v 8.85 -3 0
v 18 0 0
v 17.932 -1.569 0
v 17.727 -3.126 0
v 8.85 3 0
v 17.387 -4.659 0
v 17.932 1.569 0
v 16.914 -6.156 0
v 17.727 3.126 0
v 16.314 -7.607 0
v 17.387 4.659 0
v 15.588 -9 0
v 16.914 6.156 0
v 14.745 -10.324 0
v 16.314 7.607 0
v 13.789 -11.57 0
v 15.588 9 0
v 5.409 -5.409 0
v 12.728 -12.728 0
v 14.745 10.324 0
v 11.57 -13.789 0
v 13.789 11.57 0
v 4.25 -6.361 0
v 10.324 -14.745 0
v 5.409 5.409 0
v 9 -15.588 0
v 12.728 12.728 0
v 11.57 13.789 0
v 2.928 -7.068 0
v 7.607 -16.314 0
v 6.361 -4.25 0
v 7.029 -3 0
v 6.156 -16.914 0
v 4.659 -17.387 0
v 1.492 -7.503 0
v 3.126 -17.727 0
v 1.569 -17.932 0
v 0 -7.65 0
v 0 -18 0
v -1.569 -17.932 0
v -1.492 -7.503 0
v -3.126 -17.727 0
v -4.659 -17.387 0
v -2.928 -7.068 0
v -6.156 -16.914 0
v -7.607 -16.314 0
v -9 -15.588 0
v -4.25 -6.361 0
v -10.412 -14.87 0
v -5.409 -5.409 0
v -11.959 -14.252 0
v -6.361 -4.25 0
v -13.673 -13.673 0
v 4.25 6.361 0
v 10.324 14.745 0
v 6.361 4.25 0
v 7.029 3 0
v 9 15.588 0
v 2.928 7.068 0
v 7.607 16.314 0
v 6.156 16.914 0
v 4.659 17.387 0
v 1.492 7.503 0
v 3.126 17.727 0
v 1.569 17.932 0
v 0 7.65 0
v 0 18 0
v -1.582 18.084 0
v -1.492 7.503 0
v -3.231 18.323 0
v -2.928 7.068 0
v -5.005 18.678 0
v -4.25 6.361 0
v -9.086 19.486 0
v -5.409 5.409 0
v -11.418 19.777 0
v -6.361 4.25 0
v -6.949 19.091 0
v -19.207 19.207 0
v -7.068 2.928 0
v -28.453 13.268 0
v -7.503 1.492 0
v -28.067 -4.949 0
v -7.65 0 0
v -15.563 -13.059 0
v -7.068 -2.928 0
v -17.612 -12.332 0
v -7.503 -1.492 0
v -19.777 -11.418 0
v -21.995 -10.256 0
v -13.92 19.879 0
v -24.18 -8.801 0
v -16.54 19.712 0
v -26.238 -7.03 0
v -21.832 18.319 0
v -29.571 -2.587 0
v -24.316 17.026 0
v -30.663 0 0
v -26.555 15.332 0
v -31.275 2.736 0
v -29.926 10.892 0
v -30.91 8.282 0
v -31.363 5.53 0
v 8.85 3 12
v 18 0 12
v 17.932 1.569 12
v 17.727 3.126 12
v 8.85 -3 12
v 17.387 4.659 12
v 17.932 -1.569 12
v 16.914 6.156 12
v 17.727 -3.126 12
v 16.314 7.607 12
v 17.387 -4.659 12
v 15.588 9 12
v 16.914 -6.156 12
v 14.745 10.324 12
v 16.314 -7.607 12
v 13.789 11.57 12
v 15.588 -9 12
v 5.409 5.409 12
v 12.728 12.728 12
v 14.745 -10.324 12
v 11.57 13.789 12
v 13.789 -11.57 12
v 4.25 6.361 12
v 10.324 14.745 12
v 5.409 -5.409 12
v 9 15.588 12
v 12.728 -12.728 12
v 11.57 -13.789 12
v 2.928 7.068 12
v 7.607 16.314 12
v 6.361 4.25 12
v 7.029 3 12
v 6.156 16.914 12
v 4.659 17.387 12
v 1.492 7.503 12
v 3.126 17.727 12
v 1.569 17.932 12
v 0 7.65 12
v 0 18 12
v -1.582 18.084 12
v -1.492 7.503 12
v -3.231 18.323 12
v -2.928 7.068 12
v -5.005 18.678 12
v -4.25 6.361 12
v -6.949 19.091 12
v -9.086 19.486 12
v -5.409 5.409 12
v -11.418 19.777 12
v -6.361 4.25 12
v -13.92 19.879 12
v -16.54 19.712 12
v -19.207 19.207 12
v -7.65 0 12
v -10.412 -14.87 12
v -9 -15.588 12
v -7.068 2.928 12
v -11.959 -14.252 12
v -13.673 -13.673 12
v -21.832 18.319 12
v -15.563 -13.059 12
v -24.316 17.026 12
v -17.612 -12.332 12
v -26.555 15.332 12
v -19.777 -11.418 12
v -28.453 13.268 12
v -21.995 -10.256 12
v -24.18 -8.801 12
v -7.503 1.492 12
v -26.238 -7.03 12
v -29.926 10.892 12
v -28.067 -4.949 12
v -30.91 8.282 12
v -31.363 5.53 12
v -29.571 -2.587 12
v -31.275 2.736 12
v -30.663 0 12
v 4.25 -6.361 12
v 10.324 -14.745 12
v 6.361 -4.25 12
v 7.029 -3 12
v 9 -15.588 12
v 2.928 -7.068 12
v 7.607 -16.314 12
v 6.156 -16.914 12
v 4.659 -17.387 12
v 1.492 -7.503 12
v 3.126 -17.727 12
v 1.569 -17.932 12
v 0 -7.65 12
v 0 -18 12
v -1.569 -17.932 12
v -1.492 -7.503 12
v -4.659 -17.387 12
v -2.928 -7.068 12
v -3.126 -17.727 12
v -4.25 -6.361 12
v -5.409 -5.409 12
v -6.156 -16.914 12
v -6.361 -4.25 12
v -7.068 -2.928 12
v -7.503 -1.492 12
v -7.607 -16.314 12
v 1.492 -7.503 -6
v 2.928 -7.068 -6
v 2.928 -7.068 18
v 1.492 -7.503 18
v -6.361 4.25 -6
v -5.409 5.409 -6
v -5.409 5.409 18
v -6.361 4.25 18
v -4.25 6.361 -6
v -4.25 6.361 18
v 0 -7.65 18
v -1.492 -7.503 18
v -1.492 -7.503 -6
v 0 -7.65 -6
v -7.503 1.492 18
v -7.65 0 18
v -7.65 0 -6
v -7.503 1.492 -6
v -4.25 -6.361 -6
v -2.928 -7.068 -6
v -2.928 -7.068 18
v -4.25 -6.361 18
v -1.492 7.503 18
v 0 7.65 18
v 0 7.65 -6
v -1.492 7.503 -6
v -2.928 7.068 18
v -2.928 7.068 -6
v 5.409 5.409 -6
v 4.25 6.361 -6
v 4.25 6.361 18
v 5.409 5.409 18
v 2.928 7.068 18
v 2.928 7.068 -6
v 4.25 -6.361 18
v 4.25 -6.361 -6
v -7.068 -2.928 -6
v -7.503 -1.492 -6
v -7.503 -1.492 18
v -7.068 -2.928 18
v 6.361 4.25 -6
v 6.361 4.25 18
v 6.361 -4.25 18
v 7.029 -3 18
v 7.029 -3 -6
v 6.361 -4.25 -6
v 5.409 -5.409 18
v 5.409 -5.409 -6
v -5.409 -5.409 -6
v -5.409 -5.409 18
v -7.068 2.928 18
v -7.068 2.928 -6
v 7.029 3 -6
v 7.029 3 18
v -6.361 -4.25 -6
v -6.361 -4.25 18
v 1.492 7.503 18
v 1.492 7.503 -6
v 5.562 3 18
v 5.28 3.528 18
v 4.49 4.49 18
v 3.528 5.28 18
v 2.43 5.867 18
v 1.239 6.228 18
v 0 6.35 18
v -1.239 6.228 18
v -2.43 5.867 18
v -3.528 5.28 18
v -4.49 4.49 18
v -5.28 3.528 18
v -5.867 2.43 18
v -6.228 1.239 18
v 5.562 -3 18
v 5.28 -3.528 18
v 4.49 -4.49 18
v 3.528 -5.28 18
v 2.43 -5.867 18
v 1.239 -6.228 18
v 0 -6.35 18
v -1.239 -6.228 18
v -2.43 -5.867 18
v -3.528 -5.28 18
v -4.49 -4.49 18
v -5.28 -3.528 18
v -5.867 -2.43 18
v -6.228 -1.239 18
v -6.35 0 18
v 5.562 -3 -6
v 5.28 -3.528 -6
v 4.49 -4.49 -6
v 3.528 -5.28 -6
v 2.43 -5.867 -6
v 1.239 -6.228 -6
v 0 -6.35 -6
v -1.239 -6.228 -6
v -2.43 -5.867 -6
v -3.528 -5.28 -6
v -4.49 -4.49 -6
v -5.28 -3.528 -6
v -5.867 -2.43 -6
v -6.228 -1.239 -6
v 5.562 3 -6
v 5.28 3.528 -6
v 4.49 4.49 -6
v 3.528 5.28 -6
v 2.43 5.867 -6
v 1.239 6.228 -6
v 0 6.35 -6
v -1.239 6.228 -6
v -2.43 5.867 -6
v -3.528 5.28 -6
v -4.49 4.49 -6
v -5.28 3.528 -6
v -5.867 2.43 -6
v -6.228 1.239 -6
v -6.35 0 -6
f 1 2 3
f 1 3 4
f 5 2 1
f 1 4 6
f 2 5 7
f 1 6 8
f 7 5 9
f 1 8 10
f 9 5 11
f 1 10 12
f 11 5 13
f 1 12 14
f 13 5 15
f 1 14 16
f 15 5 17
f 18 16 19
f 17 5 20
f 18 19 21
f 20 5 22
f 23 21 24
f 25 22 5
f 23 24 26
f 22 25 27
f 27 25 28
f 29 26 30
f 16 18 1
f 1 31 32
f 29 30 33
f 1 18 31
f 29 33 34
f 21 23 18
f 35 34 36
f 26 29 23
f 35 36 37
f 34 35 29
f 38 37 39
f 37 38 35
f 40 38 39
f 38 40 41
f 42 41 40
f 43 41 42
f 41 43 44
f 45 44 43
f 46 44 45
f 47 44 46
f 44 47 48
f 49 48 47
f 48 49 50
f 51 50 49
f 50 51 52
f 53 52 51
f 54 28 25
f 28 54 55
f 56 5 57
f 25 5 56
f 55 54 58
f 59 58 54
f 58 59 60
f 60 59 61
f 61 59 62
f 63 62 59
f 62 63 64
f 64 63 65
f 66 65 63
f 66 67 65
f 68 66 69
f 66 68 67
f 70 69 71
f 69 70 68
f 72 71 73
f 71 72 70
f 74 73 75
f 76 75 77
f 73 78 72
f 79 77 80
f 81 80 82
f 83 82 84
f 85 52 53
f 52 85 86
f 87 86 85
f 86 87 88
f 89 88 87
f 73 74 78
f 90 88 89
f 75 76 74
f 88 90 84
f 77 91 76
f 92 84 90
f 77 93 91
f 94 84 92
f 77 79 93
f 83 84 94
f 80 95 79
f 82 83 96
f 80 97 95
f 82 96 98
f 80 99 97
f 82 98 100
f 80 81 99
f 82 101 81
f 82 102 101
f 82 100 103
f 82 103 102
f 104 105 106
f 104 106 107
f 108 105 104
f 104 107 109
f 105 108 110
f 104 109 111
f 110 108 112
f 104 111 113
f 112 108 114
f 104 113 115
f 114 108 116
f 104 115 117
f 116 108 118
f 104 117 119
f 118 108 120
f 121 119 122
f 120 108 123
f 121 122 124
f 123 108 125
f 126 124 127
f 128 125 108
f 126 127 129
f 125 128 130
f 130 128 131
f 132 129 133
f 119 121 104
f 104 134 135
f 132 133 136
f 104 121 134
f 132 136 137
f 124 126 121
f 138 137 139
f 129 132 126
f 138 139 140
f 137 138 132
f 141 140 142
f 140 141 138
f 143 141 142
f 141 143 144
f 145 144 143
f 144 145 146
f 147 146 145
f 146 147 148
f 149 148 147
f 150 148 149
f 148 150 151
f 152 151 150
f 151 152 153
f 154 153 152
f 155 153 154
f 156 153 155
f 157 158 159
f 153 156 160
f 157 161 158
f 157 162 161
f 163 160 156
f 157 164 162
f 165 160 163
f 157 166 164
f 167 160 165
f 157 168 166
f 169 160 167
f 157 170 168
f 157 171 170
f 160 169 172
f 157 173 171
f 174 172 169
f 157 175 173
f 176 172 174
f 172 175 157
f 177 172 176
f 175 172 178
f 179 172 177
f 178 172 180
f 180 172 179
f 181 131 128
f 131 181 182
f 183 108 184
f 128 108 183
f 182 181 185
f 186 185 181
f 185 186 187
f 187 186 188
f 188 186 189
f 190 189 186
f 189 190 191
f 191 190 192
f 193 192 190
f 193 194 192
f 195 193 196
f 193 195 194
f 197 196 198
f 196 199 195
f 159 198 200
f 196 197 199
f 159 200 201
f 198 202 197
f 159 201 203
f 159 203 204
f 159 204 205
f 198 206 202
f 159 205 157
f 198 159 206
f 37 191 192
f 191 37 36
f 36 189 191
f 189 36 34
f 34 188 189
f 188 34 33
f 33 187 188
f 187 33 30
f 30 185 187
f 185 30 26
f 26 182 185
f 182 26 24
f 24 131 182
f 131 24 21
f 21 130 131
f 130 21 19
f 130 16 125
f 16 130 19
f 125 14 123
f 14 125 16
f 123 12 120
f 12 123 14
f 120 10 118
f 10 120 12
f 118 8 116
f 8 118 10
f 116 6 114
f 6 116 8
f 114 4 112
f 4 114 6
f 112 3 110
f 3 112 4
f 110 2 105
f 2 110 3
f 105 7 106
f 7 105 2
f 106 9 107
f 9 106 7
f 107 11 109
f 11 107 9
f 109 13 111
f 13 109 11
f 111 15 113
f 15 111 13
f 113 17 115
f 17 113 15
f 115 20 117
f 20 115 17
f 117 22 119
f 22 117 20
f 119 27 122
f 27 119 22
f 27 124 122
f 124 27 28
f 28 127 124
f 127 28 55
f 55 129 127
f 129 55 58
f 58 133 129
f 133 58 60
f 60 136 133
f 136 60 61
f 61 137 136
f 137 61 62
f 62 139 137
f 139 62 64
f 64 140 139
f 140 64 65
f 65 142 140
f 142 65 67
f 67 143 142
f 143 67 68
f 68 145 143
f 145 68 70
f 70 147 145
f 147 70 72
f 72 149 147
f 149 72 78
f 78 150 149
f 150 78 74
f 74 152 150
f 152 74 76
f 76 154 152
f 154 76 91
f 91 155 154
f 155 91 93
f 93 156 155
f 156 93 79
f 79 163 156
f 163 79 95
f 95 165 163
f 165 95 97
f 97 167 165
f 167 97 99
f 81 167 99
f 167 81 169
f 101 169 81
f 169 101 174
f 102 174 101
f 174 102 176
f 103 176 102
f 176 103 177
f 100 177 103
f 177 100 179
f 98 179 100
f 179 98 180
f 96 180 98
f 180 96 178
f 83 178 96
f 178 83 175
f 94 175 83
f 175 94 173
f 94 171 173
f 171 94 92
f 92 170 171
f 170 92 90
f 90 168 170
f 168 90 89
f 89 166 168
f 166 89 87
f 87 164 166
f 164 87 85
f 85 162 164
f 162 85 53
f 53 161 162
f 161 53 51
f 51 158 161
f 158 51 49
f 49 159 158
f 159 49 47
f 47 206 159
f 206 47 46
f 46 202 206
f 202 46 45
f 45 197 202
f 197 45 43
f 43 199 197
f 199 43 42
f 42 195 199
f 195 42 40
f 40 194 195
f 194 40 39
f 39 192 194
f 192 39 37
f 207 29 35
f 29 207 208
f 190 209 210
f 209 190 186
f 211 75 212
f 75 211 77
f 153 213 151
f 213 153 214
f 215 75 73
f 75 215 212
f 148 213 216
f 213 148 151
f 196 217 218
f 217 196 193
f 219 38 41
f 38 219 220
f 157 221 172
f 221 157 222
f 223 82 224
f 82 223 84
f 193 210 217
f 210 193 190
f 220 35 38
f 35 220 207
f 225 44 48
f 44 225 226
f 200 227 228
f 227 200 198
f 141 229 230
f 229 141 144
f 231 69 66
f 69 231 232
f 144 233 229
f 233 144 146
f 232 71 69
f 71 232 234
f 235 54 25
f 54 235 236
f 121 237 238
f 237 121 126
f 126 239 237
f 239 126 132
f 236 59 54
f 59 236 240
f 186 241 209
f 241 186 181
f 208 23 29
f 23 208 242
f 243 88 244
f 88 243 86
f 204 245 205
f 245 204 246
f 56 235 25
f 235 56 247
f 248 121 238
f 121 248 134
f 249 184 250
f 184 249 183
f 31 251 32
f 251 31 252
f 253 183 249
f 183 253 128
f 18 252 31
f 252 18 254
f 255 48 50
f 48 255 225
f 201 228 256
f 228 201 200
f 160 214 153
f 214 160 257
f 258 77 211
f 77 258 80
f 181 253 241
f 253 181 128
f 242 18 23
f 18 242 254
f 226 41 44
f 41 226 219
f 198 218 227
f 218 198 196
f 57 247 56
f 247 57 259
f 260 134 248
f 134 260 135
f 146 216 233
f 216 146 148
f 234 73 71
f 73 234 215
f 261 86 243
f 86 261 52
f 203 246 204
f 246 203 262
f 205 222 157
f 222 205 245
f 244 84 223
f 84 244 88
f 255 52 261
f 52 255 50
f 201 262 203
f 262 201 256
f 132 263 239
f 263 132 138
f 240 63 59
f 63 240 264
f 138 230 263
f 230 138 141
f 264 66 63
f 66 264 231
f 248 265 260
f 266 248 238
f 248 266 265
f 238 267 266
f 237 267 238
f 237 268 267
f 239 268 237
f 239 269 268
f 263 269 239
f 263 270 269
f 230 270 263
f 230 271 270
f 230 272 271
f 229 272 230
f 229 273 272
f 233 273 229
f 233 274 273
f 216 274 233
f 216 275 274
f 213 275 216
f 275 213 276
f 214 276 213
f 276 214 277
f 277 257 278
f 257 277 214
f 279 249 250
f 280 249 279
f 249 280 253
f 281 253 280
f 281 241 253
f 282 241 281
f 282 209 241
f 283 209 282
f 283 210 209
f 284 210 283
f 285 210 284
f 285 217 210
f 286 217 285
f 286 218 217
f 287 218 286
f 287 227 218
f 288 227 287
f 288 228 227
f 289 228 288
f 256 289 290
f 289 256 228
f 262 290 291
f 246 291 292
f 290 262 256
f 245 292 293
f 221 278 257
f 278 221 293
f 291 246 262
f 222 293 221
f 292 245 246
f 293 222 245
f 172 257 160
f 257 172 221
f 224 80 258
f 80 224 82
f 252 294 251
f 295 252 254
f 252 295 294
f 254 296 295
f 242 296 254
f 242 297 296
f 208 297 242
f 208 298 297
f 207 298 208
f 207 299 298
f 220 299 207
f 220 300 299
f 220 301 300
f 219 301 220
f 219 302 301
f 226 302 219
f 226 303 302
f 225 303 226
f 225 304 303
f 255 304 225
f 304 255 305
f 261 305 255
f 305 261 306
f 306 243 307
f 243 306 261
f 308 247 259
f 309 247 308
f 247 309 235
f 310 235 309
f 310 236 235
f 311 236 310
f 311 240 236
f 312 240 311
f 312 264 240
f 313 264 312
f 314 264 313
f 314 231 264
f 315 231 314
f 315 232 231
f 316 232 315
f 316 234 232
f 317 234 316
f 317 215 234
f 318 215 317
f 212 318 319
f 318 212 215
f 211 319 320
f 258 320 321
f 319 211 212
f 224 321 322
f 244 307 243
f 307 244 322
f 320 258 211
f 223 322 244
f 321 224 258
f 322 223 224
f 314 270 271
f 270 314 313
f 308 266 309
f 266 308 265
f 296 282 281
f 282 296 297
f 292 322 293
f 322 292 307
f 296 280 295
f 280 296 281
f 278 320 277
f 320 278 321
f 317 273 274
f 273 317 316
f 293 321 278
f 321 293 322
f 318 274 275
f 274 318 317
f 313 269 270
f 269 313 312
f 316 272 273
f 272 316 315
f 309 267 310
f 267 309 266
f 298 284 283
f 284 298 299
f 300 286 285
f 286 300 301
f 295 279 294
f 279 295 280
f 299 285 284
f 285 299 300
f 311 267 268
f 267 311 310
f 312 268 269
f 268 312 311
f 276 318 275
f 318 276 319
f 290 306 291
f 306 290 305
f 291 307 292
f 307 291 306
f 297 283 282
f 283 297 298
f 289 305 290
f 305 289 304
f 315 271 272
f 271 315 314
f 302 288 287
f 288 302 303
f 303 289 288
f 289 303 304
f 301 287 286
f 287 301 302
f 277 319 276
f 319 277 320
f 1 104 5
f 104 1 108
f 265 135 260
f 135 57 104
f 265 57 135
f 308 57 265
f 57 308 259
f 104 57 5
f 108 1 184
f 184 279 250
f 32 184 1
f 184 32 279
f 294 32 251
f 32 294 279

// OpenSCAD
$fn = 32;

// ----------------------------------------------------------------------
// Cam: base radius 18 mm with a 14 mm lift over 150 degrees
// ----------------------------------------------------------------------

// --- parameters (mm) ---
base_r = 18;              // base radius
lift = 14;                // lift height above the base radius
lift_span = 150;          // angular width of the lift
lift_start = 90;          // angle where the lift starts
cam_t = 12;               // cam plate thickness
hub_d = 15.3;             // hub diameter
hub_h = 24;               // hub height
bore_d = 12.7;            // bore
key_w = 6;                // keyway width
key_depth = 1.6;          // keyway depth

cam_profile = [[18, 0], [17.932, 1.569], [17.727, 3.126], [17.387, 4.659], [16.914, 6.156], [16.314, 7.607], [15.588, 9], [14.745, 10.324], [13.789, 11.57], [12.728, 12.728], [11.57, 13.789], [10.324, 14.745], [9, 15.588], [7.607, 16.314], [6.156, 16.914], [4.659, 17.387], [3.126, 17.727], [1.569, 17.932], [0, 18], [-1.582, 18.084], [-3.231, 18.323], [-5.005, 18.678], [-6.949, 19.091], [-9.086, 19.486], [-11.418, 19.777], [-13.92, 19.879], [-16.54, 19.712], [-19.207, 19.207], [-21.832, 18.319], [-24.316, 17.026], [-26.555, 15.332], [-28.453, 13.268], [-29.926, 10.892], [-30.91, 8.282], [-31.363, 5.53], [-31.275, 2.736], [-30.663, 0], [-29.571, -2.587], [-28.067, -4.949], [-26.238, -7.03], [-24.18, -8.801], [-21.995, -10.256], [-19.777, -11.418], [-17.612, -12.332], [-15.563, -13.059], [-13.673, -13.673], [-11.959, -14.252], [-10.412, -14.87], [-9, -15.588], [-7.607, -16.314], [-6.156, -16.914], [-4.659, -17.387], [-3.126, -17.727], [-1.569, -17.932], [0, -18], [1.569, -17.932], [3.126, -17.727], [4.659, -17.387], [6.156, -16.914], [7.607, -16.314], [9, -15.588], [10.324, -14.745], [11.57, -13.789], [12.728, -12.728], [13.789, -11.57], [14.745, -10.324], [15.588, -9], [16.314, -7.607], [16.914, -6.156], [17.387, -4.659], [17.727, -3.126], [17.932, -1.569]];

difference() {
  union() {
    linear_extrude(height = cam_t) polygon(cam_profile);
    /* hub, proud of the cam plate on both sides */
    translate([0, 0, -6]) cylinder(h = hub_h, d = hub_d);
  }
  /* bore through the hub, 2.5 mm clear on both faces */
  translate([0, 0, -8.5]) cylinder(h = hub_h + 5, d = bore_d);
  /* keyway, milled through the whole hub */
  translate([4.75, -3, -8.5]) cube([4.1, 6, 29]);
}
